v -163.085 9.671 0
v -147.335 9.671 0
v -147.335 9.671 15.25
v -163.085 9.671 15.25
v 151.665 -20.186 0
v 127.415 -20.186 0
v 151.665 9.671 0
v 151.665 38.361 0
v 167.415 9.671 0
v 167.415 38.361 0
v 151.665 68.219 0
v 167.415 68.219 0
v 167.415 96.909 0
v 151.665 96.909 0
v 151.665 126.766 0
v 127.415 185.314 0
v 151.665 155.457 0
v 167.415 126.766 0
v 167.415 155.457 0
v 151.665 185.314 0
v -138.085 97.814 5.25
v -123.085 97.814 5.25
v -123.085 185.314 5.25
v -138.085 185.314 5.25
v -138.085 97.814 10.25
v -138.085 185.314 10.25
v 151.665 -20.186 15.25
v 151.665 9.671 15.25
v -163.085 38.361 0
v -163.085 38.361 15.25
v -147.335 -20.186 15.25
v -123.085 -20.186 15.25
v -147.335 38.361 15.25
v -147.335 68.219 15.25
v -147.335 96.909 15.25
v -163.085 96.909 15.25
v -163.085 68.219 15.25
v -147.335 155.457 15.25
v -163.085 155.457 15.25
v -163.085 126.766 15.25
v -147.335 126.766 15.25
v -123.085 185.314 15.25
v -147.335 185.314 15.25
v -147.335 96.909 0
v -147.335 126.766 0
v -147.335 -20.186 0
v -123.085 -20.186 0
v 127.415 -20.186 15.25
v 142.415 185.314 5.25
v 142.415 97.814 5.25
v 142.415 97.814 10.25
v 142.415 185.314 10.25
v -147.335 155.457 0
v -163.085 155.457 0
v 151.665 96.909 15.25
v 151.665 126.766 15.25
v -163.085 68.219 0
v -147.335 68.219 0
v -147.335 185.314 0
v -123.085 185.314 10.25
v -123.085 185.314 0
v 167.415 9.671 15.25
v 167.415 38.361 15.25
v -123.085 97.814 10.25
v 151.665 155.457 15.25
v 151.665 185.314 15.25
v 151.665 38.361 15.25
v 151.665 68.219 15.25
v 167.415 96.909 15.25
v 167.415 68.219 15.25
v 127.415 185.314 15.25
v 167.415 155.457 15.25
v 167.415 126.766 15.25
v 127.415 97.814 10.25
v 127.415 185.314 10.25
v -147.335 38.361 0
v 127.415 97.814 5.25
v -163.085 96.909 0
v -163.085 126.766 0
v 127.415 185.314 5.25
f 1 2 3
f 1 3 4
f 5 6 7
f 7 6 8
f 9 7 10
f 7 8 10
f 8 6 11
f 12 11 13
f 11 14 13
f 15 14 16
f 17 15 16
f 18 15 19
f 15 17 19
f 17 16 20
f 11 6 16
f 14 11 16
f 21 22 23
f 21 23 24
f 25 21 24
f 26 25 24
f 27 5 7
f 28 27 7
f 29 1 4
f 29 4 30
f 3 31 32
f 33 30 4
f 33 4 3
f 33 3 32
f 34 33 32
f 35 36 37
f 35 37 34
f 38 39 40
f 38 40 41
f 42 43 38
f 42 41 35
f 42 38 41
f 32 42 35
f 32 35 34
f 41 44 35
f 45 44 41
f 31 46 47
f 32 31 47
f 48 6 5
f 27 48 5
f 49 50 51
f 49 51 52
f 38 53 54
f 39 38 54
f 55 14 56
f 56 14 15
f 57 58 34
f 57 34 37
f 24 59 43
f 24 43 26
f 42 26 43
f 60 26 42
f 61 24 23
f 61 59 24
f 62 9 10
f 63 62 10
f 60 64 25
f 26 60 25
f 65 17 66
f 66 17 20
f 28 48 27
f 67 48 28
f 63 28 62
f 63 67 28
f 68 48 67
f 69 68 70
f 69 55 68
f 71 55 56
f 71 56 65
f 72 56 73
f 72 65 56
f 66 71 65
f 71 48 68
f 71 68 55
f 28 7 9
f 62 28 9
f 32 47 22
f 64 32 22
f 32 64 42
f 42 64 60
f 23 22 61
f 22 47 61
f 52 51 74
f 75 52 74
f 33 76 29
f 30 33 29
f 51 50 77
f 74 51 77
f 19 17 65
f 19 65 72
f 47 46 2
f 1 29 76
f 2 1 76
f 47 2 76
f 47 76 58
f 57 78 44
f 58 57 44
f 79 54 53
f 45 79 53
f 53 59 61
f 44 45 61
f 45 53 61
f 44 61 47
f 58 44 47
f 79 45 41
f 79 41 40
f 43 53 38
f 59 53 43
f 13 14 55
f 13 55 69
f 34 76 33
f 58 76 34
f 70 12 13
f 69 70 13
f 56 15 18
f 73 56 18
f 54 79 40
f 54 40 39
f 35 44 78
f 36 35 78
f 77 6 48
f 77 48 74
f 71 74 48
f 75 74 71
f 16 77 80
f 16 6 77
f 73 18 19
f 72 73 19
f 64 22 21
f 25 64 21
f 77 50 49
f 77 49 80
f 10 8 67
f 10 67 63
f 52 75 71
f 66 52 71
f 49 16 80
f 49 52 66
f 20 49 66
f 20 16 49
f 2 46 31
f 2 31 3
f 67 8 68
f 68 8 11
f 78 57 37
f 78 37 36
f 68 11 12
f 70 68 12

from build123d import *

# Parameters (mm, degrees)
ESQUISSE1_W             = 40
ESQUISSE1_H             = 205.5
BOSS_EXTRU_1_DEPTH      = 15.25
BOSS_EXTRU_1_2_DEPTH    = 15.25
ENL_V_START             = -5.25
ESQUISSE2_W             = 15
ESQUISSE2_H             = 87.5
ENL_V_MAT_EXTRU_1_DEPTH = 5
ESQUISSE3_W             = 15.75
ESQUISSE3_H             = 29.857142857
ESQUISSE3_H_2           = 29.857142858
ENL_V_MAT_EXTRU_2_DEPTH = 15.25


with BuildPart() as part:
    # Esquisse1 → Boss.-Extru.1 (new body)
    with BuildSketch(Plane.XY):
        with Locations((-143.085152838, 82.563864629)):
            Rectangle(ESQUISSE1_W, ESQUISSE1_H)
    extrude(amount=BOSS_EXTRU_1_DEPTH)


with BuildPart() as body_2:
    # Esquisse1 → Boss.-Extru.1 2 (new body)
    with BuildSketch(Plane.XY):
        with Locations((147.414847162, 82.563864629)):
            Rectangle(ESQUISSE1_W, ESQUISSE1_H)
    extrude(amount=BOSS_EXTRU_1_2_DEPTH)


with BuildPart() as enl_v_mat_extru_1_tool:
    # Esquisse2 → Enlèv. mat.-Extru.1 (new body)
    with BuildSketch(Plane(origin=(0, 0, 0), x_dir=(-1, 0, 0), z_dir=(0, 0, -1)).offset(ENL_V_START)):
        with Locations((130.585152838, 141.563864629)):
            Rectangle(ESQUISSE2_W, ESQUISSE2_H)
        with Locations((-134.914847162, 141.563864629)):
            Rectangle(ESQUISSE2_W, ESQUISSE2_H)
    extrude(amount=-ENL_V_MAT_EXTRU_1_DEPTH)


with BuildPart() as part_1:
    add(part.part)

    # Enlèv. mat.-Extru.1: cut by enl_v_mat_extru_1_tool
    add(enl_v_mat_extru_1_tool.part, mode=Mode.SUBTRACT)

    # Esquisse3 → Enlèv. mat.-Extru.2 (cut)
    with BuildSketch(Plane(origin=(0, 0, 0), x_dir=(-1, 0, 0), z_dir=(0, 0, -1))):
        with Locations((155.210152838, 170.385293201)):
            Rectangle(ESQUISSE3_W, ESQUISSE3_H)
        with Locations((155.210152838, 111.837674152)):
            Rectangle(ESQUISSE3_W, ESQUISSE3_H)
        with Locations((155.210152838, 53.290055105)):
            Rectangle(ESQUISSE3_W, ESQUISSE3_H_2)
        with Locations((155.210152838, -5.257563943)):
            Rectangle(ESQUISSE3_W, ESQUISSE3_H)
    enl_v_mat_extru_2 = extrude(amount=-ENL_V_MAT_EXTRU_2_DEPTH, mode=Mode.SUBTRACT)


with BuildPart() as body_2_1:
    add(body_2.part)

    # Enlèv. mat.-Extru.1: cut by enl_v_mat_extru_1_tool
    add(enl_v_mat_extru_1_tool.part, mode=Mode.SUBTRACT)

    # Symétrie3: Enlèv. mat.-Extru.2 across plane
    add(enl_v_mat_extru_2.mirror(Plane.ZY.offset(-2.164847162)), mode=Mode.SUBTRACT)


solid = Compound([part_1.part, body_2_1.part])
